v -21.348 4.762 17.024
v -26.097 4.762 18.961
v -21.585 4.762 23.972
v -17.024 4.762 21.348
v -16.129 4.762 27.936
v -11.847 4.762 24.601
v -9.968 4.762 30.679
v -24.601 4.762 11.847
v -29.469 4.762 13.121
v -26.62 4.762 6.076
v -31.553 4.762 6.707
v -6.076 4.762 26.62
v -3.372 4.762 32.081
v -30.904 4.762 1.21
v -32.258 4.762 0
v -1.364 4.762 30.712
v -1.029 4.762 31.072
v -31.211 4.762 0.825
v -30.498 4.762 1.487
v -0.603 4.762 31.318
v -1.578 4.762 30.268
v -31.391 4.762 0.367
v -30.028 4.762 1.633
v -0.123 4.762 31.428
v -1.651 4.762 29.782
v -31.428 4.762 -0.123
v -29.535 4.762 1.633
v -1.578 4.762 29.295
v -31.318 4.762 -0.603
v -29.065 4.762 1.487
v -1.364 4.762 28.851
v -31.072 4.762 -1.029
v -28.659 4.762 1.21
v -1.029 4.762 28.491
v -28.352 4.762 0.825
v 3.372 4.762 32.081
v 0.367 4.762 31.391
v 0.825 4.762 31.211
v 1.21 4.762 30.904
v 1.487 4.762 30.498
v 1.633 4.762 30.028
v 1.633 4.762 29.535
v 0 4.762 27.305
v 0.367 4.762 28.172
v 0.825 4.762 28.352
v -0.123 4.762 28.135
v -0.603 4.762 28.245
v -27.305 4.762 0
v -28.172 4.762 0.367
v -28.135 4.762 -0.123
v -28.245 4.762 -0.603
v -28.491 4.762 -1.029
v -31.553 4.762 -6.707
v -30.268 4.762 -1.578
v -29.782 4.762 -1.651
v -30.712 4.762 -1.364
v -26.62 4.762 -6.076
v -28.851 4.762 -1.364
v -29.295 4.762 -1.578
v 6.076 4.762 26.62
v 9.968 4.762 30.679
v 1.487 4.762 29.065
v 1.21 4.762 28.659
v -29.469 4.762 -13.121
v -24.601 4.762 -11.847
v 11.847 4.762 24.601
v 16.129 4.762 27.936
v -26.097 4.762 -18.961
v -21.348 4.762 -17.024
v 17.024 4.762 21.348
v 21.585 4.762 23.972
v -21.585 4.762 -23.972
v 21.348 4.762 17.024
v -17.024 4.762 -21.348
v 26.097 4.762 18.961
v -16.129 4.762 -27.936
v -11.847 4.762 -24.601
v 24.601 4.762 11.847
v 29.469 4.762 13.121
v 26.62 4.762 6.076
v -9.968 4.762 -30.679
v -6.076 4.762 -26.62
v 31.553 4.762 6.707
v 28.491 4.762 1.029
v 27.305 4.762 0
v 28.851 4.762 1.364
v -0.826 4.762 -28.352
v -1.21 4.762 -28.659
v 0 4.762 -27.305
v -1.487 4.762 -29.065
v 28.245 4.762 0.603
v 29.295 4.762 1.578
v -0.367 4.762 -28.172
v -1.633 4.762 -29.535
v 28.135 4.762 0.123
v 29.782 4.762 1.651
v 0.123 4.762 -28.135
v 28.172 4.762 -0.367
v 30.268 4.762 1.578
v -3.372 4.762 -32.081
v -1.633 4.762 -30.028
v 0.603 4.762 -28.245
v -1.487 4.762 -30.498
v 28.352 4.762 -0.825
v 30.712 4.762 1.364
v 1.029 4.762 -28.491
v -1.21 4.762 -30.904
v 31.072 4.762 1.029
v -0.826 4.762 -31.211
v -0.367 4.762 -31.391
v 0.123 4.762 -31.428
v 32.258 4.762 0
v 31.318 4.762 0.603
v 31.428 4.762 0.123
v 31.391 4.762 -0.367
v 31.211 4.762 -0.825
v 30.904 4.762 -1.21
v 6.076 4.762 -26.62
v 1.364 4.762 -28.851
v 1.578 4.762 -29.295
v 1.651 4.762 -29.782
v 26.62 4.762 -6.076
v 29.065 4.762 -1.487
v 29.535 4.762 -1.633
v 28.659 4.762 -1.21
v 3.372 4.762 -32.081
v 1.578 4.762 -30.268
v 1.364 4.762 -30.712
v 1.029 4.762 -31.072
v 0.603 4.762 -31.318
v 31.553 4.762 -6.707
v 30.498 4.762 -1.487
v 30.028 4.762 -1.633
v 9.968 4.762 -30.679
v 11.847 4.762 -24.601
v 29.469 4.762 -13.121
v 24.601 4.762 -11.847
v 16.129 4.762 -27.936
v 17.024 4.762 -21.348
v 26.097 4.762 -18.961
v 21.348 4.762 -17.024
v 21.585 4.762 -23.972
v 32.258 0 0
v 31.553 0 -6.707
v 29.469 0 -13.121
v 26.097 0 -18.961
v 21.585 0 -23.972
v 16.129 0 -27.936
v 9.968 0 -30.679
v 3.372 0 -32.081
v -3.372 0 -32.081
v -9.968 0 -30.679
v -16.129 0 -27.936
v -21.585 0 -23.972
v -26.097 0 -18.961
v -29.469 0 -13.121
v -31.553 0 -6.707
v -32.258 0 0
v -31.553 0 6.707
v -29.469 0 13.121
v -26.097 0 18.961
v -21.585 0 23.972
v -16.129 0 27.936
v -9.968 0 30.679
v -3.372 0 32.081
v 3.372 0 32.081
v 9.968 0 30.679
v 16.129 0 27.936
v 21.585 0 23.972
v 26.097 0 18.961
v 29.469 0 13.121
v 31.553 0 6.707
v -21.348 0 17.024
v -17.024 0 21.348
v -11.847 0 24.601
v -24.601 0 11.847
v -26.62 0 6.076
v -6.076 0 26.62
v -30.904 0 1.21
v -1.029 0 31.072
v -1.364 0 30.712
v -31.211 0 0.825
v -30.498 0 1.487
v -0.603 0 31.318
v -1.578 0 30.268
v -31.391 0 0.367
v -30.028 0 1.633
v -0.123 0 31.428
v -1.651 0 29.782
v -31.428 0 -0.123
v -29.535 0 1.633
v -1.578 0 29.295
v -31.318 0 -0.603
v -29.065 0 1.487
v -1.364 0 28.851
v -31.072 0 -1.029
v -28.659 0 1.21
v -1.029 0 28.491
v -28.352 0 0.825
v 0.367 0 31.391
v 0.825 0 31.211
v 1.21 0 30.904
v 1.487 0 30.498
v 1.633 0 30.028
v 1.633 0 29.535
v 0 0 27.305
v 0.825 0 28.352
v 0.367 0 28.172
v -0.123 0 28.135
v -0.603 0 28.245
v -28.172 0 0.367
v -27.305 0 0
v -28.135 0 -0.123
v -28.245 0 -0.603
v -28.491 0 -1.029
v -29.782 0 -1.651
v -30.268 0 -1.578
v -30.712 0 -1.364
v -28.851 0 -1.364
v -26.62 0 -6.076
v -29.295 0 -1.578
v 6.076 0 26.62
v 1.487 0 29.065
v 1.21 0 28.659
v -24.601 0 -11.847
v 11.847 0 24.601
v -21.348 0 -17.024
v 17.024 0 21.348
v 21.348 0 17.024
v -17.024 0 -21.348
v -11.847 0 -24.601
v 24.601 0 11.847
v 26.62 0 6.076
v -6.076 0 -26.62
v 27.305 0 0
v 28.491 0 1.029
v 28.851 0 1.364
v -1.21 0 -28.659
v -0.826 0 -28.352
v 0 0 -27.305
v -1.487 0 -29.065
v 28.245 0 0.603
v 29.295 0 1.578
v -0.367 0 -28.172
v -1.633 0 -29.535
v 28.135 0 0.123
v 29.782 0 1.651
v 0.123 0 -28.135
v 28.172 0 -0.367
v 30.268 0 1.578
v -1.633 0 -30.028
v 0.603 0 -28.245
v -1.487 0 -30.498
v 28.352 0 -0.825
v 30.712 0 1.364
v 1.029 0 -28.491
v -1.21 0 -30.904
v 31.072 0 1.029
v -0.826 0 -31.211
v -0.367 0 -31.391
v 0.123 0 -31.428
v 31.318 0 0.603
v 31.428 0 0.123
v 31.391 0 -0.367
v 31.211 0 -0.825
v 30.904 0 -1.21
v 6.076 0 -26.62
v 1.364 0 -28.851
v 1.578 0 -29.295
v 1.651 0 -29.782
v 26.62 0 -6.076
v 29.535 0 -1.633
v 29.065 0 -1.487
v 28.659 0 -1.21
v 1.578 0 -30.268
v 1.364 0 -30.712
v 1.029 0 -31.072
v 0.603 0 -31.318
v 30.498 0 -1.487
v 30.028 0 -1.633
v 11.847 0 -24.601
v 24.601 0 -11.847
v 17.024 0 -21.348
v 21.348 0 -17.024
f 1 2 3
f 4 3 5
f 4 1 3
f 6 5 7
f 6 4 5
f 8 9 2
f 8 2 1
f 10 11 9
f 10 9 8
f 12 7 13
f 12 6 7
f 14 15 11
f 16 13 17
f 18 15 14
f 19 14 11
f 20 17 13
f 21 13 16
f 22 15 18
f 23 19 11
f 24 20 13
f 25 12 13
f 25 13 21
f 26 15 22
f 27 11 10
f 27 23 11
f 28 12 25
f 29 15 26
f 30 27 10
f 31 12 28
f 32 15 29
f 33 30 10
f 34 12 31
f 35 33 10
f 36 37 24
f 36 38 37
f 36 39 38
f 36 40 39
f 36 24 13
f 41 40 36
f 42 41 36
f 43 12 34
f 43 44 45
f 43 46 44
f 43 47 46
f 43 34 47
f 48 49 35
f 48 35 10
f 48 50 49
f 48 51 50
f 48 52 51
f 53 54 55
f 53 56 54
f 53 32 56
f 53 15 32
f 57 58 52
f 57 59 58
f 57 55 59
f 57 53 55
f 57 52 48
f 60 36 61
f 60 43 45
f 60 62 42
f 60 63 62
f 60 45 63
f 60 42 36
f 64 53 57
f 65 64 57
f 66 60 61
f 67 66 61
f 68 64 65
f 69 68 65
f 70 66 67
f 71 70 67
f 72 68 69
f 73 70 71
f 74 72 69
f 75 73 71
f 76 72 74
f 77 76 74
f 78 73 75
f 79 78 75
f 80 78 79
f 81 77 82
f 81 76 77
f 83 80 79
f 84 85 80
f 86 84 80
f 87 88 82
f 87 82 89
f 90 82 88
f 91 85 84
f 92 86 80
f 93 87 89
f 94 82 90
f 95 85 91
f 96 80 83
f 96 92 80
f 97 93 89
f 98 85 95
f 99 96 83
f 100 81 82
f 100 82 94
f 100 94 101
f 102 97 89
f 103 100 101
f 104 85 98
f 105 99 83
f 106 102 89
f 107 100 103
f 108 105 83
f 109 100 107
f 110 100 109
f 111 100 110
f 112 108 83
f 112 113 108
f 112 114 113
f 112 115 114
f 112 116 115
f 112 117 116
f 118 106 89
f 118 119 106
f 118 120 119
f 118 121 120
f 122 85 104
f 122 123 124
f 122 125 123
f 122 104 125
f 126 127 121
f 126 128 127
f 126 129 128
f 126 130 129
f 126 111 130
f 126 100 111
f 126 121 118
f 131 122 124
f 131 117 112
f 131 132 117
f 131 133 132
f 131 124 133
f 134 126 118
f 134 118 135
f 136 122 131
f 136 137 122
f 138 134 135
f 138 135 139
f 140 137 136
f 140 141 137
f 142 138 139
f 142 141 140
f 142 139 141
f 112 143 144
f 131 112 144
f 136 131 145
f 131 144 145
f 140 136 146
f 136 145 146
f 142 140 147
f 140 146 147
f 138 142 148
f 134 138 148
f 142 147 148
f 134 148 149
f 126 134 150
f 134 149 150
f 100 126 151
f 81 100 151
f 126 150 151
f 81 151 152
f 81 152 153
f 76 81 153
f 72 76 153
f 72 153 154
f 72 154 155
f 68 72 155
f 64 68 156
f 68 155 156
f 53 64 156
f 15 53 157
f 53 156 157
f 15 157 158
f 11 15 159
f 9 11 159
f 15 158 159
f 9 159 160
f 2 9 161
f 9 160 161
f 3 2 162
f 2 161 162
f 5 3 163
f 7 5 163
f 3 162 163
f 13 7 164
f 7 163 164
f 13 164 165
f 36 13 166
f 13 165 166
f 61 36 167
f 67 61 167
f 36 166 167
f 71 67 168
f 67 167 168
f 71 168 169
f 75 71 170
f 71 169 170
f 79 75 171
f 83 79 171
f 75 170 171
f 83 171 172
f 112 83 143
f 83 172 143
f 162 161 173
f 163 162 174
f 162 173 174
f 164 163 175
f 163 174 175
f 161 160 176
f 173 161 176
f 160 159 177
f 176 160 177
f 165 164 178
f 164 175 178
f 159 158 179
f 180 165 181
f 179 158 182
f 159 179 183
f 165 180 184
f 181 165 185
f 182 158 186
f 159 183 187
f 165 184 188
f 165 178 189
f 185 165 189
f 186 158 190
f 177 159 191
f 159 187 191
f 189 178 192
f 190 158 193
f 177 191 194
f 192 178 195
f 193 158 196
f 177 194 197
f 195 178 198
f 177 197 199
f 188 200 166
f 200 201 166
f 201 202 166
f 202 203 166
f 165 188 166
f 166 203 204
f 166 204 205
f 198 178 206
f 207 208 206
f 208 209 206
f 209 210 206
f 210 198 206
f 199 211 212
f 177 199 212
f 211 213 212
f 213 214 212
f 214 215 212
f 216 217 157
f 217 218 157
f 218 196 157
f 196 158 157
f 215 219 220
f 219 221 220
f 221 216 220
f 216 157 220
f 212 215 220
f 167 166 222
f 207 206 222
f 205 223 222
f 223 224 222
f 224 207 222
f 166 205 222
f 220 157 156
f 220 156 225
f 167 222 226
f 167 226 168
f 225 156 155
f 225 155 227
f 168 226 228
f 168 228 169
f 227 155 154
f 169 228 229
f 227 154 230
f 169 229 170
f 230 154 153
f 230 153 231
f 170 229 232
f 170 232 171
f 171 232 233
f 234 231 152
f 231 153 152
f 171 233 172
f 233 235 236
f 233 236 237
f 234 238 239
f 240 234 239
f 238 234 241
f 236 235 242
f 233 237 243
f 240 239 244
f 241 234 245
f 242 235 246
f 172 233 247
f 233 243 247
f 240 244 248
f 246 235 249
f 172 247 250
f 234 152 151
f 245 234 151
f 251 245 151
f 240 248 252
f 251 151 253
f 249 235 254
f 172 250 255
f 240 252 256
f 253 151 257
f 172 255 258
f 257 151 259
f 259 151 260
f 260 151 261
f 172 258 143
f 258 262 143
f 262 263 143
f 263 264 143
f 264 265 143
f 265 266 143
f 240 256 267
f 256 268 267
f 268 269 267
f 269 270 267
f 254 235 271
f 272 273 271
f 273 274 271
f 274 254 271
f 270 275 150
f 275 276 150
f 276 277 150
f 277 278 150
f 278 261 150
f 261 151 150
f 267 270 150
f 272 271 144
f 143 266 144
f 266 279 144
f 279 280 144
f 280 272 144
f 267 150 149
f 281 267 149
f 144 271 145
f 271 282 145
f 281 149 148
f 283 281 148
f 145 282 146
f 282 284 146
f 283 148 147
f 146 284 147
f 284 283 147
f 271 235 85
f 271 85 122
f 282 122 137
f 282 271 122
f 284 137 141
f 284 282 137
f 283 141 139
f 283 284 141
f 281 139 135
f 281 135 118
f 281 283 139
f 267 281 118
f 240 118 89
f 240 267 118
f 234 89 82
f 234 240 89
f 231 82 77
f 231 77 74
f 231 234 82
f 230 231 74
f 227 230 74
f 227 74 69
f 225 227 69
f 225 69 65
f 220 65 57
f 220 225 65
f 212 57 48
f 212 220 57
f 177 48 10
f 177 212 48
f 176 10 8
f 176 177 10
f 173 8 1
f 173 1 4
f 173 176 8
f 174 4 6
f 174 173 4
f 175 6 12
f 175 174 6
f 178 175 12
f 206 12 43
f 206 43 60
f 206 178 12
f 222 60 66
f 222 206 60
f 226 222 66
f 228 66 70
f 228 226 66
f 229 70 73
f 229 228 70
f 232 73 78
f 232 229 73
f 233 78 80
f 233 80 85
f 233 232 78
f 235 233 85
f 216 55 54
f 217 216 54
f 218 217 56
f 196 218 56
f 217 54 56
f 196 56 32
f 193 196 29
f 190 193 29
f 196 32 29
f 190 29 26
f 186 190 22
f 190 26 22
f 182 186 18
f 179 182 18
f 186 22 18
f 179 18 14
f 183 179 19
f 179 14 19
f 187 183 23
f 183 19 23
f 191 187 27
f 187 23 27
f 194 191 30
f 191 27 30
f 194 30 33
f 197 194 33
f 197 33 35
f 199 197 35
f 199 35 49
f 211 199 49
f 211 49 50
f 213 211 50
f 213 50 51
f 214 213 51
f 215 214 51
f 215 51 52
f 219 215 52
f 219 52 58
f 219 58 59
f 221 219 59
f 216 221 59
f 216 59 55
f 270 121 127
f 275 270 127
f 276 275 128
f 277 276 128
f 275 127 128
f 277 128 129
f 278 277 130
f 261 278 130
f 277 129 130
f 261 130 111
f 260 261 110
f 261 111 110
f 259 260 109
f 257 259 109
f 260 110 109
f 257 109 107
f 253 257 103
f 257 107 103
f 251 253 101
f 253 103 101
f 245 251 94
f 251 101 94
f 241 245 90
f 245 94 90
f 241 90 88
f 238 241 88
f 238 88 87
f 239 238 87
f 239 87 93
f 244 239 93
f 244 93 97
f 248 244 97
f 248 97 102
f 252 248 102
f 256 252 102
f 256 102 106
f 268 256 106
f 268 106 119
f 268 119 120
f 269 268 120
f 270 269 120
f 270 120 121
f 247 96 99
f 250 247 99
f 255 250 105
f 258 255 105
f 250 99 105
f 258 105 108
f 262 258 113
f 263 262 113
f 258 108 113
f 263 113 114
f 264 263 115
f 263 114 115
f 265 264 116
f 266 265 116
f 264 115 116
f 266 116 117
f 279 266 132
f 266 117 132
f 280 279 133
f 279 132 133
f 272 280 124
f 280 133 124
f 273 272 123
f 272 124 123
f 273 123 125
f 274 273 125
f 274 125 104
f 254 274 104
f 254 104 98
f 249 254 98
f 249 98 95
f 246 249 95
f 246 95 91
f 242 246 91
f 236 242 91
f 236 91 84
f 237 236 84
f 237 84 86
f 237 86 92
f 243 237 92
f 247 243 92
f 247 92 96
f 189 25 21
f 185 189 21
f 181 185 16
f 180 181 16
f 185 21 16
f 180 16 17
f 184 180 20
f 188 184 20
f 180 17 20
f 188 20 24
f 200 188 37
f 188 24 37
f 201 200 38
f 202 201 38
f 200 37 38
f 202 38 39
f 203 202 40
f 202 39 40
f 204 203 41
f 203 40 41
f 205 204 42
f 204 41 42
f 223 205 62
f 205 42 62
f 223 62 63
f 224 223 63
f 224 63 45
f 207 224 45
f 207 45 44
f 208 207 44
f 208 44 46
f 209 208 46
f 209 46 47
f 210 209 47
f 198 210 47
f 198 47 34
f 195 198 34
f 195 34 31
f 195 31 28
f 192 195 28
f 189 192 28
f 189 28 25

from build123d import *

# Parameters (mm, degrees)
SKETCH2_R           = 32.258
SKETCH2_R_2         = 27.305
BOSS_EXTRUDE1_DEPTH = 4.7625
SKETCH3_R           = 1.651
CUT_EXTRUDE1_DEPTH  = 5.7625
CIRPATTERN1_COUNT   = 4


with BuildPart() as part:
    # Sketch2 → Boss-Extrude1 (new body)
    with BuildSketch(Plane(origin=(0, 0, 0), x_dir=(1, 0, 0), z_dir=(0, 1, 0))):
        Circle(SKETCH2_R)
        Circle(SKETCH2_R_2, mode=Mode.SUBTRACT)
    extrude(amount=BOSS_EXTRUDE1_DEPTH)

    # Sketch3 → Cut-Extrude1 (cut, through all)
    with BuildSketch(Plane(origin=(0, 4.7625, 0), x_dir=(1, 0, 0), z_dir=(0, 1, 0))):
        with Locations((0, 29.7815)):
            Circle(SKETCH3_R)
    cut_extrude1 = extrude(amount=-CUT_EXTRUDE1_DEPTH, mode=Mode.SUBTRACT)

    # CirPattern1: Cut-Extrude1 ×4 about axis
    cirpattern1_axis = Axis((0, 0, 0), (0, 1, 0))
    for i in range(1, CIRPATTERN1_COUNT):
        add(cut_extrude1.rotate(cirpattern1_axis, i * 360 / CIRPATTERN1_COUNT), mode=Mode.SUBTRACT)


solid = part.part
